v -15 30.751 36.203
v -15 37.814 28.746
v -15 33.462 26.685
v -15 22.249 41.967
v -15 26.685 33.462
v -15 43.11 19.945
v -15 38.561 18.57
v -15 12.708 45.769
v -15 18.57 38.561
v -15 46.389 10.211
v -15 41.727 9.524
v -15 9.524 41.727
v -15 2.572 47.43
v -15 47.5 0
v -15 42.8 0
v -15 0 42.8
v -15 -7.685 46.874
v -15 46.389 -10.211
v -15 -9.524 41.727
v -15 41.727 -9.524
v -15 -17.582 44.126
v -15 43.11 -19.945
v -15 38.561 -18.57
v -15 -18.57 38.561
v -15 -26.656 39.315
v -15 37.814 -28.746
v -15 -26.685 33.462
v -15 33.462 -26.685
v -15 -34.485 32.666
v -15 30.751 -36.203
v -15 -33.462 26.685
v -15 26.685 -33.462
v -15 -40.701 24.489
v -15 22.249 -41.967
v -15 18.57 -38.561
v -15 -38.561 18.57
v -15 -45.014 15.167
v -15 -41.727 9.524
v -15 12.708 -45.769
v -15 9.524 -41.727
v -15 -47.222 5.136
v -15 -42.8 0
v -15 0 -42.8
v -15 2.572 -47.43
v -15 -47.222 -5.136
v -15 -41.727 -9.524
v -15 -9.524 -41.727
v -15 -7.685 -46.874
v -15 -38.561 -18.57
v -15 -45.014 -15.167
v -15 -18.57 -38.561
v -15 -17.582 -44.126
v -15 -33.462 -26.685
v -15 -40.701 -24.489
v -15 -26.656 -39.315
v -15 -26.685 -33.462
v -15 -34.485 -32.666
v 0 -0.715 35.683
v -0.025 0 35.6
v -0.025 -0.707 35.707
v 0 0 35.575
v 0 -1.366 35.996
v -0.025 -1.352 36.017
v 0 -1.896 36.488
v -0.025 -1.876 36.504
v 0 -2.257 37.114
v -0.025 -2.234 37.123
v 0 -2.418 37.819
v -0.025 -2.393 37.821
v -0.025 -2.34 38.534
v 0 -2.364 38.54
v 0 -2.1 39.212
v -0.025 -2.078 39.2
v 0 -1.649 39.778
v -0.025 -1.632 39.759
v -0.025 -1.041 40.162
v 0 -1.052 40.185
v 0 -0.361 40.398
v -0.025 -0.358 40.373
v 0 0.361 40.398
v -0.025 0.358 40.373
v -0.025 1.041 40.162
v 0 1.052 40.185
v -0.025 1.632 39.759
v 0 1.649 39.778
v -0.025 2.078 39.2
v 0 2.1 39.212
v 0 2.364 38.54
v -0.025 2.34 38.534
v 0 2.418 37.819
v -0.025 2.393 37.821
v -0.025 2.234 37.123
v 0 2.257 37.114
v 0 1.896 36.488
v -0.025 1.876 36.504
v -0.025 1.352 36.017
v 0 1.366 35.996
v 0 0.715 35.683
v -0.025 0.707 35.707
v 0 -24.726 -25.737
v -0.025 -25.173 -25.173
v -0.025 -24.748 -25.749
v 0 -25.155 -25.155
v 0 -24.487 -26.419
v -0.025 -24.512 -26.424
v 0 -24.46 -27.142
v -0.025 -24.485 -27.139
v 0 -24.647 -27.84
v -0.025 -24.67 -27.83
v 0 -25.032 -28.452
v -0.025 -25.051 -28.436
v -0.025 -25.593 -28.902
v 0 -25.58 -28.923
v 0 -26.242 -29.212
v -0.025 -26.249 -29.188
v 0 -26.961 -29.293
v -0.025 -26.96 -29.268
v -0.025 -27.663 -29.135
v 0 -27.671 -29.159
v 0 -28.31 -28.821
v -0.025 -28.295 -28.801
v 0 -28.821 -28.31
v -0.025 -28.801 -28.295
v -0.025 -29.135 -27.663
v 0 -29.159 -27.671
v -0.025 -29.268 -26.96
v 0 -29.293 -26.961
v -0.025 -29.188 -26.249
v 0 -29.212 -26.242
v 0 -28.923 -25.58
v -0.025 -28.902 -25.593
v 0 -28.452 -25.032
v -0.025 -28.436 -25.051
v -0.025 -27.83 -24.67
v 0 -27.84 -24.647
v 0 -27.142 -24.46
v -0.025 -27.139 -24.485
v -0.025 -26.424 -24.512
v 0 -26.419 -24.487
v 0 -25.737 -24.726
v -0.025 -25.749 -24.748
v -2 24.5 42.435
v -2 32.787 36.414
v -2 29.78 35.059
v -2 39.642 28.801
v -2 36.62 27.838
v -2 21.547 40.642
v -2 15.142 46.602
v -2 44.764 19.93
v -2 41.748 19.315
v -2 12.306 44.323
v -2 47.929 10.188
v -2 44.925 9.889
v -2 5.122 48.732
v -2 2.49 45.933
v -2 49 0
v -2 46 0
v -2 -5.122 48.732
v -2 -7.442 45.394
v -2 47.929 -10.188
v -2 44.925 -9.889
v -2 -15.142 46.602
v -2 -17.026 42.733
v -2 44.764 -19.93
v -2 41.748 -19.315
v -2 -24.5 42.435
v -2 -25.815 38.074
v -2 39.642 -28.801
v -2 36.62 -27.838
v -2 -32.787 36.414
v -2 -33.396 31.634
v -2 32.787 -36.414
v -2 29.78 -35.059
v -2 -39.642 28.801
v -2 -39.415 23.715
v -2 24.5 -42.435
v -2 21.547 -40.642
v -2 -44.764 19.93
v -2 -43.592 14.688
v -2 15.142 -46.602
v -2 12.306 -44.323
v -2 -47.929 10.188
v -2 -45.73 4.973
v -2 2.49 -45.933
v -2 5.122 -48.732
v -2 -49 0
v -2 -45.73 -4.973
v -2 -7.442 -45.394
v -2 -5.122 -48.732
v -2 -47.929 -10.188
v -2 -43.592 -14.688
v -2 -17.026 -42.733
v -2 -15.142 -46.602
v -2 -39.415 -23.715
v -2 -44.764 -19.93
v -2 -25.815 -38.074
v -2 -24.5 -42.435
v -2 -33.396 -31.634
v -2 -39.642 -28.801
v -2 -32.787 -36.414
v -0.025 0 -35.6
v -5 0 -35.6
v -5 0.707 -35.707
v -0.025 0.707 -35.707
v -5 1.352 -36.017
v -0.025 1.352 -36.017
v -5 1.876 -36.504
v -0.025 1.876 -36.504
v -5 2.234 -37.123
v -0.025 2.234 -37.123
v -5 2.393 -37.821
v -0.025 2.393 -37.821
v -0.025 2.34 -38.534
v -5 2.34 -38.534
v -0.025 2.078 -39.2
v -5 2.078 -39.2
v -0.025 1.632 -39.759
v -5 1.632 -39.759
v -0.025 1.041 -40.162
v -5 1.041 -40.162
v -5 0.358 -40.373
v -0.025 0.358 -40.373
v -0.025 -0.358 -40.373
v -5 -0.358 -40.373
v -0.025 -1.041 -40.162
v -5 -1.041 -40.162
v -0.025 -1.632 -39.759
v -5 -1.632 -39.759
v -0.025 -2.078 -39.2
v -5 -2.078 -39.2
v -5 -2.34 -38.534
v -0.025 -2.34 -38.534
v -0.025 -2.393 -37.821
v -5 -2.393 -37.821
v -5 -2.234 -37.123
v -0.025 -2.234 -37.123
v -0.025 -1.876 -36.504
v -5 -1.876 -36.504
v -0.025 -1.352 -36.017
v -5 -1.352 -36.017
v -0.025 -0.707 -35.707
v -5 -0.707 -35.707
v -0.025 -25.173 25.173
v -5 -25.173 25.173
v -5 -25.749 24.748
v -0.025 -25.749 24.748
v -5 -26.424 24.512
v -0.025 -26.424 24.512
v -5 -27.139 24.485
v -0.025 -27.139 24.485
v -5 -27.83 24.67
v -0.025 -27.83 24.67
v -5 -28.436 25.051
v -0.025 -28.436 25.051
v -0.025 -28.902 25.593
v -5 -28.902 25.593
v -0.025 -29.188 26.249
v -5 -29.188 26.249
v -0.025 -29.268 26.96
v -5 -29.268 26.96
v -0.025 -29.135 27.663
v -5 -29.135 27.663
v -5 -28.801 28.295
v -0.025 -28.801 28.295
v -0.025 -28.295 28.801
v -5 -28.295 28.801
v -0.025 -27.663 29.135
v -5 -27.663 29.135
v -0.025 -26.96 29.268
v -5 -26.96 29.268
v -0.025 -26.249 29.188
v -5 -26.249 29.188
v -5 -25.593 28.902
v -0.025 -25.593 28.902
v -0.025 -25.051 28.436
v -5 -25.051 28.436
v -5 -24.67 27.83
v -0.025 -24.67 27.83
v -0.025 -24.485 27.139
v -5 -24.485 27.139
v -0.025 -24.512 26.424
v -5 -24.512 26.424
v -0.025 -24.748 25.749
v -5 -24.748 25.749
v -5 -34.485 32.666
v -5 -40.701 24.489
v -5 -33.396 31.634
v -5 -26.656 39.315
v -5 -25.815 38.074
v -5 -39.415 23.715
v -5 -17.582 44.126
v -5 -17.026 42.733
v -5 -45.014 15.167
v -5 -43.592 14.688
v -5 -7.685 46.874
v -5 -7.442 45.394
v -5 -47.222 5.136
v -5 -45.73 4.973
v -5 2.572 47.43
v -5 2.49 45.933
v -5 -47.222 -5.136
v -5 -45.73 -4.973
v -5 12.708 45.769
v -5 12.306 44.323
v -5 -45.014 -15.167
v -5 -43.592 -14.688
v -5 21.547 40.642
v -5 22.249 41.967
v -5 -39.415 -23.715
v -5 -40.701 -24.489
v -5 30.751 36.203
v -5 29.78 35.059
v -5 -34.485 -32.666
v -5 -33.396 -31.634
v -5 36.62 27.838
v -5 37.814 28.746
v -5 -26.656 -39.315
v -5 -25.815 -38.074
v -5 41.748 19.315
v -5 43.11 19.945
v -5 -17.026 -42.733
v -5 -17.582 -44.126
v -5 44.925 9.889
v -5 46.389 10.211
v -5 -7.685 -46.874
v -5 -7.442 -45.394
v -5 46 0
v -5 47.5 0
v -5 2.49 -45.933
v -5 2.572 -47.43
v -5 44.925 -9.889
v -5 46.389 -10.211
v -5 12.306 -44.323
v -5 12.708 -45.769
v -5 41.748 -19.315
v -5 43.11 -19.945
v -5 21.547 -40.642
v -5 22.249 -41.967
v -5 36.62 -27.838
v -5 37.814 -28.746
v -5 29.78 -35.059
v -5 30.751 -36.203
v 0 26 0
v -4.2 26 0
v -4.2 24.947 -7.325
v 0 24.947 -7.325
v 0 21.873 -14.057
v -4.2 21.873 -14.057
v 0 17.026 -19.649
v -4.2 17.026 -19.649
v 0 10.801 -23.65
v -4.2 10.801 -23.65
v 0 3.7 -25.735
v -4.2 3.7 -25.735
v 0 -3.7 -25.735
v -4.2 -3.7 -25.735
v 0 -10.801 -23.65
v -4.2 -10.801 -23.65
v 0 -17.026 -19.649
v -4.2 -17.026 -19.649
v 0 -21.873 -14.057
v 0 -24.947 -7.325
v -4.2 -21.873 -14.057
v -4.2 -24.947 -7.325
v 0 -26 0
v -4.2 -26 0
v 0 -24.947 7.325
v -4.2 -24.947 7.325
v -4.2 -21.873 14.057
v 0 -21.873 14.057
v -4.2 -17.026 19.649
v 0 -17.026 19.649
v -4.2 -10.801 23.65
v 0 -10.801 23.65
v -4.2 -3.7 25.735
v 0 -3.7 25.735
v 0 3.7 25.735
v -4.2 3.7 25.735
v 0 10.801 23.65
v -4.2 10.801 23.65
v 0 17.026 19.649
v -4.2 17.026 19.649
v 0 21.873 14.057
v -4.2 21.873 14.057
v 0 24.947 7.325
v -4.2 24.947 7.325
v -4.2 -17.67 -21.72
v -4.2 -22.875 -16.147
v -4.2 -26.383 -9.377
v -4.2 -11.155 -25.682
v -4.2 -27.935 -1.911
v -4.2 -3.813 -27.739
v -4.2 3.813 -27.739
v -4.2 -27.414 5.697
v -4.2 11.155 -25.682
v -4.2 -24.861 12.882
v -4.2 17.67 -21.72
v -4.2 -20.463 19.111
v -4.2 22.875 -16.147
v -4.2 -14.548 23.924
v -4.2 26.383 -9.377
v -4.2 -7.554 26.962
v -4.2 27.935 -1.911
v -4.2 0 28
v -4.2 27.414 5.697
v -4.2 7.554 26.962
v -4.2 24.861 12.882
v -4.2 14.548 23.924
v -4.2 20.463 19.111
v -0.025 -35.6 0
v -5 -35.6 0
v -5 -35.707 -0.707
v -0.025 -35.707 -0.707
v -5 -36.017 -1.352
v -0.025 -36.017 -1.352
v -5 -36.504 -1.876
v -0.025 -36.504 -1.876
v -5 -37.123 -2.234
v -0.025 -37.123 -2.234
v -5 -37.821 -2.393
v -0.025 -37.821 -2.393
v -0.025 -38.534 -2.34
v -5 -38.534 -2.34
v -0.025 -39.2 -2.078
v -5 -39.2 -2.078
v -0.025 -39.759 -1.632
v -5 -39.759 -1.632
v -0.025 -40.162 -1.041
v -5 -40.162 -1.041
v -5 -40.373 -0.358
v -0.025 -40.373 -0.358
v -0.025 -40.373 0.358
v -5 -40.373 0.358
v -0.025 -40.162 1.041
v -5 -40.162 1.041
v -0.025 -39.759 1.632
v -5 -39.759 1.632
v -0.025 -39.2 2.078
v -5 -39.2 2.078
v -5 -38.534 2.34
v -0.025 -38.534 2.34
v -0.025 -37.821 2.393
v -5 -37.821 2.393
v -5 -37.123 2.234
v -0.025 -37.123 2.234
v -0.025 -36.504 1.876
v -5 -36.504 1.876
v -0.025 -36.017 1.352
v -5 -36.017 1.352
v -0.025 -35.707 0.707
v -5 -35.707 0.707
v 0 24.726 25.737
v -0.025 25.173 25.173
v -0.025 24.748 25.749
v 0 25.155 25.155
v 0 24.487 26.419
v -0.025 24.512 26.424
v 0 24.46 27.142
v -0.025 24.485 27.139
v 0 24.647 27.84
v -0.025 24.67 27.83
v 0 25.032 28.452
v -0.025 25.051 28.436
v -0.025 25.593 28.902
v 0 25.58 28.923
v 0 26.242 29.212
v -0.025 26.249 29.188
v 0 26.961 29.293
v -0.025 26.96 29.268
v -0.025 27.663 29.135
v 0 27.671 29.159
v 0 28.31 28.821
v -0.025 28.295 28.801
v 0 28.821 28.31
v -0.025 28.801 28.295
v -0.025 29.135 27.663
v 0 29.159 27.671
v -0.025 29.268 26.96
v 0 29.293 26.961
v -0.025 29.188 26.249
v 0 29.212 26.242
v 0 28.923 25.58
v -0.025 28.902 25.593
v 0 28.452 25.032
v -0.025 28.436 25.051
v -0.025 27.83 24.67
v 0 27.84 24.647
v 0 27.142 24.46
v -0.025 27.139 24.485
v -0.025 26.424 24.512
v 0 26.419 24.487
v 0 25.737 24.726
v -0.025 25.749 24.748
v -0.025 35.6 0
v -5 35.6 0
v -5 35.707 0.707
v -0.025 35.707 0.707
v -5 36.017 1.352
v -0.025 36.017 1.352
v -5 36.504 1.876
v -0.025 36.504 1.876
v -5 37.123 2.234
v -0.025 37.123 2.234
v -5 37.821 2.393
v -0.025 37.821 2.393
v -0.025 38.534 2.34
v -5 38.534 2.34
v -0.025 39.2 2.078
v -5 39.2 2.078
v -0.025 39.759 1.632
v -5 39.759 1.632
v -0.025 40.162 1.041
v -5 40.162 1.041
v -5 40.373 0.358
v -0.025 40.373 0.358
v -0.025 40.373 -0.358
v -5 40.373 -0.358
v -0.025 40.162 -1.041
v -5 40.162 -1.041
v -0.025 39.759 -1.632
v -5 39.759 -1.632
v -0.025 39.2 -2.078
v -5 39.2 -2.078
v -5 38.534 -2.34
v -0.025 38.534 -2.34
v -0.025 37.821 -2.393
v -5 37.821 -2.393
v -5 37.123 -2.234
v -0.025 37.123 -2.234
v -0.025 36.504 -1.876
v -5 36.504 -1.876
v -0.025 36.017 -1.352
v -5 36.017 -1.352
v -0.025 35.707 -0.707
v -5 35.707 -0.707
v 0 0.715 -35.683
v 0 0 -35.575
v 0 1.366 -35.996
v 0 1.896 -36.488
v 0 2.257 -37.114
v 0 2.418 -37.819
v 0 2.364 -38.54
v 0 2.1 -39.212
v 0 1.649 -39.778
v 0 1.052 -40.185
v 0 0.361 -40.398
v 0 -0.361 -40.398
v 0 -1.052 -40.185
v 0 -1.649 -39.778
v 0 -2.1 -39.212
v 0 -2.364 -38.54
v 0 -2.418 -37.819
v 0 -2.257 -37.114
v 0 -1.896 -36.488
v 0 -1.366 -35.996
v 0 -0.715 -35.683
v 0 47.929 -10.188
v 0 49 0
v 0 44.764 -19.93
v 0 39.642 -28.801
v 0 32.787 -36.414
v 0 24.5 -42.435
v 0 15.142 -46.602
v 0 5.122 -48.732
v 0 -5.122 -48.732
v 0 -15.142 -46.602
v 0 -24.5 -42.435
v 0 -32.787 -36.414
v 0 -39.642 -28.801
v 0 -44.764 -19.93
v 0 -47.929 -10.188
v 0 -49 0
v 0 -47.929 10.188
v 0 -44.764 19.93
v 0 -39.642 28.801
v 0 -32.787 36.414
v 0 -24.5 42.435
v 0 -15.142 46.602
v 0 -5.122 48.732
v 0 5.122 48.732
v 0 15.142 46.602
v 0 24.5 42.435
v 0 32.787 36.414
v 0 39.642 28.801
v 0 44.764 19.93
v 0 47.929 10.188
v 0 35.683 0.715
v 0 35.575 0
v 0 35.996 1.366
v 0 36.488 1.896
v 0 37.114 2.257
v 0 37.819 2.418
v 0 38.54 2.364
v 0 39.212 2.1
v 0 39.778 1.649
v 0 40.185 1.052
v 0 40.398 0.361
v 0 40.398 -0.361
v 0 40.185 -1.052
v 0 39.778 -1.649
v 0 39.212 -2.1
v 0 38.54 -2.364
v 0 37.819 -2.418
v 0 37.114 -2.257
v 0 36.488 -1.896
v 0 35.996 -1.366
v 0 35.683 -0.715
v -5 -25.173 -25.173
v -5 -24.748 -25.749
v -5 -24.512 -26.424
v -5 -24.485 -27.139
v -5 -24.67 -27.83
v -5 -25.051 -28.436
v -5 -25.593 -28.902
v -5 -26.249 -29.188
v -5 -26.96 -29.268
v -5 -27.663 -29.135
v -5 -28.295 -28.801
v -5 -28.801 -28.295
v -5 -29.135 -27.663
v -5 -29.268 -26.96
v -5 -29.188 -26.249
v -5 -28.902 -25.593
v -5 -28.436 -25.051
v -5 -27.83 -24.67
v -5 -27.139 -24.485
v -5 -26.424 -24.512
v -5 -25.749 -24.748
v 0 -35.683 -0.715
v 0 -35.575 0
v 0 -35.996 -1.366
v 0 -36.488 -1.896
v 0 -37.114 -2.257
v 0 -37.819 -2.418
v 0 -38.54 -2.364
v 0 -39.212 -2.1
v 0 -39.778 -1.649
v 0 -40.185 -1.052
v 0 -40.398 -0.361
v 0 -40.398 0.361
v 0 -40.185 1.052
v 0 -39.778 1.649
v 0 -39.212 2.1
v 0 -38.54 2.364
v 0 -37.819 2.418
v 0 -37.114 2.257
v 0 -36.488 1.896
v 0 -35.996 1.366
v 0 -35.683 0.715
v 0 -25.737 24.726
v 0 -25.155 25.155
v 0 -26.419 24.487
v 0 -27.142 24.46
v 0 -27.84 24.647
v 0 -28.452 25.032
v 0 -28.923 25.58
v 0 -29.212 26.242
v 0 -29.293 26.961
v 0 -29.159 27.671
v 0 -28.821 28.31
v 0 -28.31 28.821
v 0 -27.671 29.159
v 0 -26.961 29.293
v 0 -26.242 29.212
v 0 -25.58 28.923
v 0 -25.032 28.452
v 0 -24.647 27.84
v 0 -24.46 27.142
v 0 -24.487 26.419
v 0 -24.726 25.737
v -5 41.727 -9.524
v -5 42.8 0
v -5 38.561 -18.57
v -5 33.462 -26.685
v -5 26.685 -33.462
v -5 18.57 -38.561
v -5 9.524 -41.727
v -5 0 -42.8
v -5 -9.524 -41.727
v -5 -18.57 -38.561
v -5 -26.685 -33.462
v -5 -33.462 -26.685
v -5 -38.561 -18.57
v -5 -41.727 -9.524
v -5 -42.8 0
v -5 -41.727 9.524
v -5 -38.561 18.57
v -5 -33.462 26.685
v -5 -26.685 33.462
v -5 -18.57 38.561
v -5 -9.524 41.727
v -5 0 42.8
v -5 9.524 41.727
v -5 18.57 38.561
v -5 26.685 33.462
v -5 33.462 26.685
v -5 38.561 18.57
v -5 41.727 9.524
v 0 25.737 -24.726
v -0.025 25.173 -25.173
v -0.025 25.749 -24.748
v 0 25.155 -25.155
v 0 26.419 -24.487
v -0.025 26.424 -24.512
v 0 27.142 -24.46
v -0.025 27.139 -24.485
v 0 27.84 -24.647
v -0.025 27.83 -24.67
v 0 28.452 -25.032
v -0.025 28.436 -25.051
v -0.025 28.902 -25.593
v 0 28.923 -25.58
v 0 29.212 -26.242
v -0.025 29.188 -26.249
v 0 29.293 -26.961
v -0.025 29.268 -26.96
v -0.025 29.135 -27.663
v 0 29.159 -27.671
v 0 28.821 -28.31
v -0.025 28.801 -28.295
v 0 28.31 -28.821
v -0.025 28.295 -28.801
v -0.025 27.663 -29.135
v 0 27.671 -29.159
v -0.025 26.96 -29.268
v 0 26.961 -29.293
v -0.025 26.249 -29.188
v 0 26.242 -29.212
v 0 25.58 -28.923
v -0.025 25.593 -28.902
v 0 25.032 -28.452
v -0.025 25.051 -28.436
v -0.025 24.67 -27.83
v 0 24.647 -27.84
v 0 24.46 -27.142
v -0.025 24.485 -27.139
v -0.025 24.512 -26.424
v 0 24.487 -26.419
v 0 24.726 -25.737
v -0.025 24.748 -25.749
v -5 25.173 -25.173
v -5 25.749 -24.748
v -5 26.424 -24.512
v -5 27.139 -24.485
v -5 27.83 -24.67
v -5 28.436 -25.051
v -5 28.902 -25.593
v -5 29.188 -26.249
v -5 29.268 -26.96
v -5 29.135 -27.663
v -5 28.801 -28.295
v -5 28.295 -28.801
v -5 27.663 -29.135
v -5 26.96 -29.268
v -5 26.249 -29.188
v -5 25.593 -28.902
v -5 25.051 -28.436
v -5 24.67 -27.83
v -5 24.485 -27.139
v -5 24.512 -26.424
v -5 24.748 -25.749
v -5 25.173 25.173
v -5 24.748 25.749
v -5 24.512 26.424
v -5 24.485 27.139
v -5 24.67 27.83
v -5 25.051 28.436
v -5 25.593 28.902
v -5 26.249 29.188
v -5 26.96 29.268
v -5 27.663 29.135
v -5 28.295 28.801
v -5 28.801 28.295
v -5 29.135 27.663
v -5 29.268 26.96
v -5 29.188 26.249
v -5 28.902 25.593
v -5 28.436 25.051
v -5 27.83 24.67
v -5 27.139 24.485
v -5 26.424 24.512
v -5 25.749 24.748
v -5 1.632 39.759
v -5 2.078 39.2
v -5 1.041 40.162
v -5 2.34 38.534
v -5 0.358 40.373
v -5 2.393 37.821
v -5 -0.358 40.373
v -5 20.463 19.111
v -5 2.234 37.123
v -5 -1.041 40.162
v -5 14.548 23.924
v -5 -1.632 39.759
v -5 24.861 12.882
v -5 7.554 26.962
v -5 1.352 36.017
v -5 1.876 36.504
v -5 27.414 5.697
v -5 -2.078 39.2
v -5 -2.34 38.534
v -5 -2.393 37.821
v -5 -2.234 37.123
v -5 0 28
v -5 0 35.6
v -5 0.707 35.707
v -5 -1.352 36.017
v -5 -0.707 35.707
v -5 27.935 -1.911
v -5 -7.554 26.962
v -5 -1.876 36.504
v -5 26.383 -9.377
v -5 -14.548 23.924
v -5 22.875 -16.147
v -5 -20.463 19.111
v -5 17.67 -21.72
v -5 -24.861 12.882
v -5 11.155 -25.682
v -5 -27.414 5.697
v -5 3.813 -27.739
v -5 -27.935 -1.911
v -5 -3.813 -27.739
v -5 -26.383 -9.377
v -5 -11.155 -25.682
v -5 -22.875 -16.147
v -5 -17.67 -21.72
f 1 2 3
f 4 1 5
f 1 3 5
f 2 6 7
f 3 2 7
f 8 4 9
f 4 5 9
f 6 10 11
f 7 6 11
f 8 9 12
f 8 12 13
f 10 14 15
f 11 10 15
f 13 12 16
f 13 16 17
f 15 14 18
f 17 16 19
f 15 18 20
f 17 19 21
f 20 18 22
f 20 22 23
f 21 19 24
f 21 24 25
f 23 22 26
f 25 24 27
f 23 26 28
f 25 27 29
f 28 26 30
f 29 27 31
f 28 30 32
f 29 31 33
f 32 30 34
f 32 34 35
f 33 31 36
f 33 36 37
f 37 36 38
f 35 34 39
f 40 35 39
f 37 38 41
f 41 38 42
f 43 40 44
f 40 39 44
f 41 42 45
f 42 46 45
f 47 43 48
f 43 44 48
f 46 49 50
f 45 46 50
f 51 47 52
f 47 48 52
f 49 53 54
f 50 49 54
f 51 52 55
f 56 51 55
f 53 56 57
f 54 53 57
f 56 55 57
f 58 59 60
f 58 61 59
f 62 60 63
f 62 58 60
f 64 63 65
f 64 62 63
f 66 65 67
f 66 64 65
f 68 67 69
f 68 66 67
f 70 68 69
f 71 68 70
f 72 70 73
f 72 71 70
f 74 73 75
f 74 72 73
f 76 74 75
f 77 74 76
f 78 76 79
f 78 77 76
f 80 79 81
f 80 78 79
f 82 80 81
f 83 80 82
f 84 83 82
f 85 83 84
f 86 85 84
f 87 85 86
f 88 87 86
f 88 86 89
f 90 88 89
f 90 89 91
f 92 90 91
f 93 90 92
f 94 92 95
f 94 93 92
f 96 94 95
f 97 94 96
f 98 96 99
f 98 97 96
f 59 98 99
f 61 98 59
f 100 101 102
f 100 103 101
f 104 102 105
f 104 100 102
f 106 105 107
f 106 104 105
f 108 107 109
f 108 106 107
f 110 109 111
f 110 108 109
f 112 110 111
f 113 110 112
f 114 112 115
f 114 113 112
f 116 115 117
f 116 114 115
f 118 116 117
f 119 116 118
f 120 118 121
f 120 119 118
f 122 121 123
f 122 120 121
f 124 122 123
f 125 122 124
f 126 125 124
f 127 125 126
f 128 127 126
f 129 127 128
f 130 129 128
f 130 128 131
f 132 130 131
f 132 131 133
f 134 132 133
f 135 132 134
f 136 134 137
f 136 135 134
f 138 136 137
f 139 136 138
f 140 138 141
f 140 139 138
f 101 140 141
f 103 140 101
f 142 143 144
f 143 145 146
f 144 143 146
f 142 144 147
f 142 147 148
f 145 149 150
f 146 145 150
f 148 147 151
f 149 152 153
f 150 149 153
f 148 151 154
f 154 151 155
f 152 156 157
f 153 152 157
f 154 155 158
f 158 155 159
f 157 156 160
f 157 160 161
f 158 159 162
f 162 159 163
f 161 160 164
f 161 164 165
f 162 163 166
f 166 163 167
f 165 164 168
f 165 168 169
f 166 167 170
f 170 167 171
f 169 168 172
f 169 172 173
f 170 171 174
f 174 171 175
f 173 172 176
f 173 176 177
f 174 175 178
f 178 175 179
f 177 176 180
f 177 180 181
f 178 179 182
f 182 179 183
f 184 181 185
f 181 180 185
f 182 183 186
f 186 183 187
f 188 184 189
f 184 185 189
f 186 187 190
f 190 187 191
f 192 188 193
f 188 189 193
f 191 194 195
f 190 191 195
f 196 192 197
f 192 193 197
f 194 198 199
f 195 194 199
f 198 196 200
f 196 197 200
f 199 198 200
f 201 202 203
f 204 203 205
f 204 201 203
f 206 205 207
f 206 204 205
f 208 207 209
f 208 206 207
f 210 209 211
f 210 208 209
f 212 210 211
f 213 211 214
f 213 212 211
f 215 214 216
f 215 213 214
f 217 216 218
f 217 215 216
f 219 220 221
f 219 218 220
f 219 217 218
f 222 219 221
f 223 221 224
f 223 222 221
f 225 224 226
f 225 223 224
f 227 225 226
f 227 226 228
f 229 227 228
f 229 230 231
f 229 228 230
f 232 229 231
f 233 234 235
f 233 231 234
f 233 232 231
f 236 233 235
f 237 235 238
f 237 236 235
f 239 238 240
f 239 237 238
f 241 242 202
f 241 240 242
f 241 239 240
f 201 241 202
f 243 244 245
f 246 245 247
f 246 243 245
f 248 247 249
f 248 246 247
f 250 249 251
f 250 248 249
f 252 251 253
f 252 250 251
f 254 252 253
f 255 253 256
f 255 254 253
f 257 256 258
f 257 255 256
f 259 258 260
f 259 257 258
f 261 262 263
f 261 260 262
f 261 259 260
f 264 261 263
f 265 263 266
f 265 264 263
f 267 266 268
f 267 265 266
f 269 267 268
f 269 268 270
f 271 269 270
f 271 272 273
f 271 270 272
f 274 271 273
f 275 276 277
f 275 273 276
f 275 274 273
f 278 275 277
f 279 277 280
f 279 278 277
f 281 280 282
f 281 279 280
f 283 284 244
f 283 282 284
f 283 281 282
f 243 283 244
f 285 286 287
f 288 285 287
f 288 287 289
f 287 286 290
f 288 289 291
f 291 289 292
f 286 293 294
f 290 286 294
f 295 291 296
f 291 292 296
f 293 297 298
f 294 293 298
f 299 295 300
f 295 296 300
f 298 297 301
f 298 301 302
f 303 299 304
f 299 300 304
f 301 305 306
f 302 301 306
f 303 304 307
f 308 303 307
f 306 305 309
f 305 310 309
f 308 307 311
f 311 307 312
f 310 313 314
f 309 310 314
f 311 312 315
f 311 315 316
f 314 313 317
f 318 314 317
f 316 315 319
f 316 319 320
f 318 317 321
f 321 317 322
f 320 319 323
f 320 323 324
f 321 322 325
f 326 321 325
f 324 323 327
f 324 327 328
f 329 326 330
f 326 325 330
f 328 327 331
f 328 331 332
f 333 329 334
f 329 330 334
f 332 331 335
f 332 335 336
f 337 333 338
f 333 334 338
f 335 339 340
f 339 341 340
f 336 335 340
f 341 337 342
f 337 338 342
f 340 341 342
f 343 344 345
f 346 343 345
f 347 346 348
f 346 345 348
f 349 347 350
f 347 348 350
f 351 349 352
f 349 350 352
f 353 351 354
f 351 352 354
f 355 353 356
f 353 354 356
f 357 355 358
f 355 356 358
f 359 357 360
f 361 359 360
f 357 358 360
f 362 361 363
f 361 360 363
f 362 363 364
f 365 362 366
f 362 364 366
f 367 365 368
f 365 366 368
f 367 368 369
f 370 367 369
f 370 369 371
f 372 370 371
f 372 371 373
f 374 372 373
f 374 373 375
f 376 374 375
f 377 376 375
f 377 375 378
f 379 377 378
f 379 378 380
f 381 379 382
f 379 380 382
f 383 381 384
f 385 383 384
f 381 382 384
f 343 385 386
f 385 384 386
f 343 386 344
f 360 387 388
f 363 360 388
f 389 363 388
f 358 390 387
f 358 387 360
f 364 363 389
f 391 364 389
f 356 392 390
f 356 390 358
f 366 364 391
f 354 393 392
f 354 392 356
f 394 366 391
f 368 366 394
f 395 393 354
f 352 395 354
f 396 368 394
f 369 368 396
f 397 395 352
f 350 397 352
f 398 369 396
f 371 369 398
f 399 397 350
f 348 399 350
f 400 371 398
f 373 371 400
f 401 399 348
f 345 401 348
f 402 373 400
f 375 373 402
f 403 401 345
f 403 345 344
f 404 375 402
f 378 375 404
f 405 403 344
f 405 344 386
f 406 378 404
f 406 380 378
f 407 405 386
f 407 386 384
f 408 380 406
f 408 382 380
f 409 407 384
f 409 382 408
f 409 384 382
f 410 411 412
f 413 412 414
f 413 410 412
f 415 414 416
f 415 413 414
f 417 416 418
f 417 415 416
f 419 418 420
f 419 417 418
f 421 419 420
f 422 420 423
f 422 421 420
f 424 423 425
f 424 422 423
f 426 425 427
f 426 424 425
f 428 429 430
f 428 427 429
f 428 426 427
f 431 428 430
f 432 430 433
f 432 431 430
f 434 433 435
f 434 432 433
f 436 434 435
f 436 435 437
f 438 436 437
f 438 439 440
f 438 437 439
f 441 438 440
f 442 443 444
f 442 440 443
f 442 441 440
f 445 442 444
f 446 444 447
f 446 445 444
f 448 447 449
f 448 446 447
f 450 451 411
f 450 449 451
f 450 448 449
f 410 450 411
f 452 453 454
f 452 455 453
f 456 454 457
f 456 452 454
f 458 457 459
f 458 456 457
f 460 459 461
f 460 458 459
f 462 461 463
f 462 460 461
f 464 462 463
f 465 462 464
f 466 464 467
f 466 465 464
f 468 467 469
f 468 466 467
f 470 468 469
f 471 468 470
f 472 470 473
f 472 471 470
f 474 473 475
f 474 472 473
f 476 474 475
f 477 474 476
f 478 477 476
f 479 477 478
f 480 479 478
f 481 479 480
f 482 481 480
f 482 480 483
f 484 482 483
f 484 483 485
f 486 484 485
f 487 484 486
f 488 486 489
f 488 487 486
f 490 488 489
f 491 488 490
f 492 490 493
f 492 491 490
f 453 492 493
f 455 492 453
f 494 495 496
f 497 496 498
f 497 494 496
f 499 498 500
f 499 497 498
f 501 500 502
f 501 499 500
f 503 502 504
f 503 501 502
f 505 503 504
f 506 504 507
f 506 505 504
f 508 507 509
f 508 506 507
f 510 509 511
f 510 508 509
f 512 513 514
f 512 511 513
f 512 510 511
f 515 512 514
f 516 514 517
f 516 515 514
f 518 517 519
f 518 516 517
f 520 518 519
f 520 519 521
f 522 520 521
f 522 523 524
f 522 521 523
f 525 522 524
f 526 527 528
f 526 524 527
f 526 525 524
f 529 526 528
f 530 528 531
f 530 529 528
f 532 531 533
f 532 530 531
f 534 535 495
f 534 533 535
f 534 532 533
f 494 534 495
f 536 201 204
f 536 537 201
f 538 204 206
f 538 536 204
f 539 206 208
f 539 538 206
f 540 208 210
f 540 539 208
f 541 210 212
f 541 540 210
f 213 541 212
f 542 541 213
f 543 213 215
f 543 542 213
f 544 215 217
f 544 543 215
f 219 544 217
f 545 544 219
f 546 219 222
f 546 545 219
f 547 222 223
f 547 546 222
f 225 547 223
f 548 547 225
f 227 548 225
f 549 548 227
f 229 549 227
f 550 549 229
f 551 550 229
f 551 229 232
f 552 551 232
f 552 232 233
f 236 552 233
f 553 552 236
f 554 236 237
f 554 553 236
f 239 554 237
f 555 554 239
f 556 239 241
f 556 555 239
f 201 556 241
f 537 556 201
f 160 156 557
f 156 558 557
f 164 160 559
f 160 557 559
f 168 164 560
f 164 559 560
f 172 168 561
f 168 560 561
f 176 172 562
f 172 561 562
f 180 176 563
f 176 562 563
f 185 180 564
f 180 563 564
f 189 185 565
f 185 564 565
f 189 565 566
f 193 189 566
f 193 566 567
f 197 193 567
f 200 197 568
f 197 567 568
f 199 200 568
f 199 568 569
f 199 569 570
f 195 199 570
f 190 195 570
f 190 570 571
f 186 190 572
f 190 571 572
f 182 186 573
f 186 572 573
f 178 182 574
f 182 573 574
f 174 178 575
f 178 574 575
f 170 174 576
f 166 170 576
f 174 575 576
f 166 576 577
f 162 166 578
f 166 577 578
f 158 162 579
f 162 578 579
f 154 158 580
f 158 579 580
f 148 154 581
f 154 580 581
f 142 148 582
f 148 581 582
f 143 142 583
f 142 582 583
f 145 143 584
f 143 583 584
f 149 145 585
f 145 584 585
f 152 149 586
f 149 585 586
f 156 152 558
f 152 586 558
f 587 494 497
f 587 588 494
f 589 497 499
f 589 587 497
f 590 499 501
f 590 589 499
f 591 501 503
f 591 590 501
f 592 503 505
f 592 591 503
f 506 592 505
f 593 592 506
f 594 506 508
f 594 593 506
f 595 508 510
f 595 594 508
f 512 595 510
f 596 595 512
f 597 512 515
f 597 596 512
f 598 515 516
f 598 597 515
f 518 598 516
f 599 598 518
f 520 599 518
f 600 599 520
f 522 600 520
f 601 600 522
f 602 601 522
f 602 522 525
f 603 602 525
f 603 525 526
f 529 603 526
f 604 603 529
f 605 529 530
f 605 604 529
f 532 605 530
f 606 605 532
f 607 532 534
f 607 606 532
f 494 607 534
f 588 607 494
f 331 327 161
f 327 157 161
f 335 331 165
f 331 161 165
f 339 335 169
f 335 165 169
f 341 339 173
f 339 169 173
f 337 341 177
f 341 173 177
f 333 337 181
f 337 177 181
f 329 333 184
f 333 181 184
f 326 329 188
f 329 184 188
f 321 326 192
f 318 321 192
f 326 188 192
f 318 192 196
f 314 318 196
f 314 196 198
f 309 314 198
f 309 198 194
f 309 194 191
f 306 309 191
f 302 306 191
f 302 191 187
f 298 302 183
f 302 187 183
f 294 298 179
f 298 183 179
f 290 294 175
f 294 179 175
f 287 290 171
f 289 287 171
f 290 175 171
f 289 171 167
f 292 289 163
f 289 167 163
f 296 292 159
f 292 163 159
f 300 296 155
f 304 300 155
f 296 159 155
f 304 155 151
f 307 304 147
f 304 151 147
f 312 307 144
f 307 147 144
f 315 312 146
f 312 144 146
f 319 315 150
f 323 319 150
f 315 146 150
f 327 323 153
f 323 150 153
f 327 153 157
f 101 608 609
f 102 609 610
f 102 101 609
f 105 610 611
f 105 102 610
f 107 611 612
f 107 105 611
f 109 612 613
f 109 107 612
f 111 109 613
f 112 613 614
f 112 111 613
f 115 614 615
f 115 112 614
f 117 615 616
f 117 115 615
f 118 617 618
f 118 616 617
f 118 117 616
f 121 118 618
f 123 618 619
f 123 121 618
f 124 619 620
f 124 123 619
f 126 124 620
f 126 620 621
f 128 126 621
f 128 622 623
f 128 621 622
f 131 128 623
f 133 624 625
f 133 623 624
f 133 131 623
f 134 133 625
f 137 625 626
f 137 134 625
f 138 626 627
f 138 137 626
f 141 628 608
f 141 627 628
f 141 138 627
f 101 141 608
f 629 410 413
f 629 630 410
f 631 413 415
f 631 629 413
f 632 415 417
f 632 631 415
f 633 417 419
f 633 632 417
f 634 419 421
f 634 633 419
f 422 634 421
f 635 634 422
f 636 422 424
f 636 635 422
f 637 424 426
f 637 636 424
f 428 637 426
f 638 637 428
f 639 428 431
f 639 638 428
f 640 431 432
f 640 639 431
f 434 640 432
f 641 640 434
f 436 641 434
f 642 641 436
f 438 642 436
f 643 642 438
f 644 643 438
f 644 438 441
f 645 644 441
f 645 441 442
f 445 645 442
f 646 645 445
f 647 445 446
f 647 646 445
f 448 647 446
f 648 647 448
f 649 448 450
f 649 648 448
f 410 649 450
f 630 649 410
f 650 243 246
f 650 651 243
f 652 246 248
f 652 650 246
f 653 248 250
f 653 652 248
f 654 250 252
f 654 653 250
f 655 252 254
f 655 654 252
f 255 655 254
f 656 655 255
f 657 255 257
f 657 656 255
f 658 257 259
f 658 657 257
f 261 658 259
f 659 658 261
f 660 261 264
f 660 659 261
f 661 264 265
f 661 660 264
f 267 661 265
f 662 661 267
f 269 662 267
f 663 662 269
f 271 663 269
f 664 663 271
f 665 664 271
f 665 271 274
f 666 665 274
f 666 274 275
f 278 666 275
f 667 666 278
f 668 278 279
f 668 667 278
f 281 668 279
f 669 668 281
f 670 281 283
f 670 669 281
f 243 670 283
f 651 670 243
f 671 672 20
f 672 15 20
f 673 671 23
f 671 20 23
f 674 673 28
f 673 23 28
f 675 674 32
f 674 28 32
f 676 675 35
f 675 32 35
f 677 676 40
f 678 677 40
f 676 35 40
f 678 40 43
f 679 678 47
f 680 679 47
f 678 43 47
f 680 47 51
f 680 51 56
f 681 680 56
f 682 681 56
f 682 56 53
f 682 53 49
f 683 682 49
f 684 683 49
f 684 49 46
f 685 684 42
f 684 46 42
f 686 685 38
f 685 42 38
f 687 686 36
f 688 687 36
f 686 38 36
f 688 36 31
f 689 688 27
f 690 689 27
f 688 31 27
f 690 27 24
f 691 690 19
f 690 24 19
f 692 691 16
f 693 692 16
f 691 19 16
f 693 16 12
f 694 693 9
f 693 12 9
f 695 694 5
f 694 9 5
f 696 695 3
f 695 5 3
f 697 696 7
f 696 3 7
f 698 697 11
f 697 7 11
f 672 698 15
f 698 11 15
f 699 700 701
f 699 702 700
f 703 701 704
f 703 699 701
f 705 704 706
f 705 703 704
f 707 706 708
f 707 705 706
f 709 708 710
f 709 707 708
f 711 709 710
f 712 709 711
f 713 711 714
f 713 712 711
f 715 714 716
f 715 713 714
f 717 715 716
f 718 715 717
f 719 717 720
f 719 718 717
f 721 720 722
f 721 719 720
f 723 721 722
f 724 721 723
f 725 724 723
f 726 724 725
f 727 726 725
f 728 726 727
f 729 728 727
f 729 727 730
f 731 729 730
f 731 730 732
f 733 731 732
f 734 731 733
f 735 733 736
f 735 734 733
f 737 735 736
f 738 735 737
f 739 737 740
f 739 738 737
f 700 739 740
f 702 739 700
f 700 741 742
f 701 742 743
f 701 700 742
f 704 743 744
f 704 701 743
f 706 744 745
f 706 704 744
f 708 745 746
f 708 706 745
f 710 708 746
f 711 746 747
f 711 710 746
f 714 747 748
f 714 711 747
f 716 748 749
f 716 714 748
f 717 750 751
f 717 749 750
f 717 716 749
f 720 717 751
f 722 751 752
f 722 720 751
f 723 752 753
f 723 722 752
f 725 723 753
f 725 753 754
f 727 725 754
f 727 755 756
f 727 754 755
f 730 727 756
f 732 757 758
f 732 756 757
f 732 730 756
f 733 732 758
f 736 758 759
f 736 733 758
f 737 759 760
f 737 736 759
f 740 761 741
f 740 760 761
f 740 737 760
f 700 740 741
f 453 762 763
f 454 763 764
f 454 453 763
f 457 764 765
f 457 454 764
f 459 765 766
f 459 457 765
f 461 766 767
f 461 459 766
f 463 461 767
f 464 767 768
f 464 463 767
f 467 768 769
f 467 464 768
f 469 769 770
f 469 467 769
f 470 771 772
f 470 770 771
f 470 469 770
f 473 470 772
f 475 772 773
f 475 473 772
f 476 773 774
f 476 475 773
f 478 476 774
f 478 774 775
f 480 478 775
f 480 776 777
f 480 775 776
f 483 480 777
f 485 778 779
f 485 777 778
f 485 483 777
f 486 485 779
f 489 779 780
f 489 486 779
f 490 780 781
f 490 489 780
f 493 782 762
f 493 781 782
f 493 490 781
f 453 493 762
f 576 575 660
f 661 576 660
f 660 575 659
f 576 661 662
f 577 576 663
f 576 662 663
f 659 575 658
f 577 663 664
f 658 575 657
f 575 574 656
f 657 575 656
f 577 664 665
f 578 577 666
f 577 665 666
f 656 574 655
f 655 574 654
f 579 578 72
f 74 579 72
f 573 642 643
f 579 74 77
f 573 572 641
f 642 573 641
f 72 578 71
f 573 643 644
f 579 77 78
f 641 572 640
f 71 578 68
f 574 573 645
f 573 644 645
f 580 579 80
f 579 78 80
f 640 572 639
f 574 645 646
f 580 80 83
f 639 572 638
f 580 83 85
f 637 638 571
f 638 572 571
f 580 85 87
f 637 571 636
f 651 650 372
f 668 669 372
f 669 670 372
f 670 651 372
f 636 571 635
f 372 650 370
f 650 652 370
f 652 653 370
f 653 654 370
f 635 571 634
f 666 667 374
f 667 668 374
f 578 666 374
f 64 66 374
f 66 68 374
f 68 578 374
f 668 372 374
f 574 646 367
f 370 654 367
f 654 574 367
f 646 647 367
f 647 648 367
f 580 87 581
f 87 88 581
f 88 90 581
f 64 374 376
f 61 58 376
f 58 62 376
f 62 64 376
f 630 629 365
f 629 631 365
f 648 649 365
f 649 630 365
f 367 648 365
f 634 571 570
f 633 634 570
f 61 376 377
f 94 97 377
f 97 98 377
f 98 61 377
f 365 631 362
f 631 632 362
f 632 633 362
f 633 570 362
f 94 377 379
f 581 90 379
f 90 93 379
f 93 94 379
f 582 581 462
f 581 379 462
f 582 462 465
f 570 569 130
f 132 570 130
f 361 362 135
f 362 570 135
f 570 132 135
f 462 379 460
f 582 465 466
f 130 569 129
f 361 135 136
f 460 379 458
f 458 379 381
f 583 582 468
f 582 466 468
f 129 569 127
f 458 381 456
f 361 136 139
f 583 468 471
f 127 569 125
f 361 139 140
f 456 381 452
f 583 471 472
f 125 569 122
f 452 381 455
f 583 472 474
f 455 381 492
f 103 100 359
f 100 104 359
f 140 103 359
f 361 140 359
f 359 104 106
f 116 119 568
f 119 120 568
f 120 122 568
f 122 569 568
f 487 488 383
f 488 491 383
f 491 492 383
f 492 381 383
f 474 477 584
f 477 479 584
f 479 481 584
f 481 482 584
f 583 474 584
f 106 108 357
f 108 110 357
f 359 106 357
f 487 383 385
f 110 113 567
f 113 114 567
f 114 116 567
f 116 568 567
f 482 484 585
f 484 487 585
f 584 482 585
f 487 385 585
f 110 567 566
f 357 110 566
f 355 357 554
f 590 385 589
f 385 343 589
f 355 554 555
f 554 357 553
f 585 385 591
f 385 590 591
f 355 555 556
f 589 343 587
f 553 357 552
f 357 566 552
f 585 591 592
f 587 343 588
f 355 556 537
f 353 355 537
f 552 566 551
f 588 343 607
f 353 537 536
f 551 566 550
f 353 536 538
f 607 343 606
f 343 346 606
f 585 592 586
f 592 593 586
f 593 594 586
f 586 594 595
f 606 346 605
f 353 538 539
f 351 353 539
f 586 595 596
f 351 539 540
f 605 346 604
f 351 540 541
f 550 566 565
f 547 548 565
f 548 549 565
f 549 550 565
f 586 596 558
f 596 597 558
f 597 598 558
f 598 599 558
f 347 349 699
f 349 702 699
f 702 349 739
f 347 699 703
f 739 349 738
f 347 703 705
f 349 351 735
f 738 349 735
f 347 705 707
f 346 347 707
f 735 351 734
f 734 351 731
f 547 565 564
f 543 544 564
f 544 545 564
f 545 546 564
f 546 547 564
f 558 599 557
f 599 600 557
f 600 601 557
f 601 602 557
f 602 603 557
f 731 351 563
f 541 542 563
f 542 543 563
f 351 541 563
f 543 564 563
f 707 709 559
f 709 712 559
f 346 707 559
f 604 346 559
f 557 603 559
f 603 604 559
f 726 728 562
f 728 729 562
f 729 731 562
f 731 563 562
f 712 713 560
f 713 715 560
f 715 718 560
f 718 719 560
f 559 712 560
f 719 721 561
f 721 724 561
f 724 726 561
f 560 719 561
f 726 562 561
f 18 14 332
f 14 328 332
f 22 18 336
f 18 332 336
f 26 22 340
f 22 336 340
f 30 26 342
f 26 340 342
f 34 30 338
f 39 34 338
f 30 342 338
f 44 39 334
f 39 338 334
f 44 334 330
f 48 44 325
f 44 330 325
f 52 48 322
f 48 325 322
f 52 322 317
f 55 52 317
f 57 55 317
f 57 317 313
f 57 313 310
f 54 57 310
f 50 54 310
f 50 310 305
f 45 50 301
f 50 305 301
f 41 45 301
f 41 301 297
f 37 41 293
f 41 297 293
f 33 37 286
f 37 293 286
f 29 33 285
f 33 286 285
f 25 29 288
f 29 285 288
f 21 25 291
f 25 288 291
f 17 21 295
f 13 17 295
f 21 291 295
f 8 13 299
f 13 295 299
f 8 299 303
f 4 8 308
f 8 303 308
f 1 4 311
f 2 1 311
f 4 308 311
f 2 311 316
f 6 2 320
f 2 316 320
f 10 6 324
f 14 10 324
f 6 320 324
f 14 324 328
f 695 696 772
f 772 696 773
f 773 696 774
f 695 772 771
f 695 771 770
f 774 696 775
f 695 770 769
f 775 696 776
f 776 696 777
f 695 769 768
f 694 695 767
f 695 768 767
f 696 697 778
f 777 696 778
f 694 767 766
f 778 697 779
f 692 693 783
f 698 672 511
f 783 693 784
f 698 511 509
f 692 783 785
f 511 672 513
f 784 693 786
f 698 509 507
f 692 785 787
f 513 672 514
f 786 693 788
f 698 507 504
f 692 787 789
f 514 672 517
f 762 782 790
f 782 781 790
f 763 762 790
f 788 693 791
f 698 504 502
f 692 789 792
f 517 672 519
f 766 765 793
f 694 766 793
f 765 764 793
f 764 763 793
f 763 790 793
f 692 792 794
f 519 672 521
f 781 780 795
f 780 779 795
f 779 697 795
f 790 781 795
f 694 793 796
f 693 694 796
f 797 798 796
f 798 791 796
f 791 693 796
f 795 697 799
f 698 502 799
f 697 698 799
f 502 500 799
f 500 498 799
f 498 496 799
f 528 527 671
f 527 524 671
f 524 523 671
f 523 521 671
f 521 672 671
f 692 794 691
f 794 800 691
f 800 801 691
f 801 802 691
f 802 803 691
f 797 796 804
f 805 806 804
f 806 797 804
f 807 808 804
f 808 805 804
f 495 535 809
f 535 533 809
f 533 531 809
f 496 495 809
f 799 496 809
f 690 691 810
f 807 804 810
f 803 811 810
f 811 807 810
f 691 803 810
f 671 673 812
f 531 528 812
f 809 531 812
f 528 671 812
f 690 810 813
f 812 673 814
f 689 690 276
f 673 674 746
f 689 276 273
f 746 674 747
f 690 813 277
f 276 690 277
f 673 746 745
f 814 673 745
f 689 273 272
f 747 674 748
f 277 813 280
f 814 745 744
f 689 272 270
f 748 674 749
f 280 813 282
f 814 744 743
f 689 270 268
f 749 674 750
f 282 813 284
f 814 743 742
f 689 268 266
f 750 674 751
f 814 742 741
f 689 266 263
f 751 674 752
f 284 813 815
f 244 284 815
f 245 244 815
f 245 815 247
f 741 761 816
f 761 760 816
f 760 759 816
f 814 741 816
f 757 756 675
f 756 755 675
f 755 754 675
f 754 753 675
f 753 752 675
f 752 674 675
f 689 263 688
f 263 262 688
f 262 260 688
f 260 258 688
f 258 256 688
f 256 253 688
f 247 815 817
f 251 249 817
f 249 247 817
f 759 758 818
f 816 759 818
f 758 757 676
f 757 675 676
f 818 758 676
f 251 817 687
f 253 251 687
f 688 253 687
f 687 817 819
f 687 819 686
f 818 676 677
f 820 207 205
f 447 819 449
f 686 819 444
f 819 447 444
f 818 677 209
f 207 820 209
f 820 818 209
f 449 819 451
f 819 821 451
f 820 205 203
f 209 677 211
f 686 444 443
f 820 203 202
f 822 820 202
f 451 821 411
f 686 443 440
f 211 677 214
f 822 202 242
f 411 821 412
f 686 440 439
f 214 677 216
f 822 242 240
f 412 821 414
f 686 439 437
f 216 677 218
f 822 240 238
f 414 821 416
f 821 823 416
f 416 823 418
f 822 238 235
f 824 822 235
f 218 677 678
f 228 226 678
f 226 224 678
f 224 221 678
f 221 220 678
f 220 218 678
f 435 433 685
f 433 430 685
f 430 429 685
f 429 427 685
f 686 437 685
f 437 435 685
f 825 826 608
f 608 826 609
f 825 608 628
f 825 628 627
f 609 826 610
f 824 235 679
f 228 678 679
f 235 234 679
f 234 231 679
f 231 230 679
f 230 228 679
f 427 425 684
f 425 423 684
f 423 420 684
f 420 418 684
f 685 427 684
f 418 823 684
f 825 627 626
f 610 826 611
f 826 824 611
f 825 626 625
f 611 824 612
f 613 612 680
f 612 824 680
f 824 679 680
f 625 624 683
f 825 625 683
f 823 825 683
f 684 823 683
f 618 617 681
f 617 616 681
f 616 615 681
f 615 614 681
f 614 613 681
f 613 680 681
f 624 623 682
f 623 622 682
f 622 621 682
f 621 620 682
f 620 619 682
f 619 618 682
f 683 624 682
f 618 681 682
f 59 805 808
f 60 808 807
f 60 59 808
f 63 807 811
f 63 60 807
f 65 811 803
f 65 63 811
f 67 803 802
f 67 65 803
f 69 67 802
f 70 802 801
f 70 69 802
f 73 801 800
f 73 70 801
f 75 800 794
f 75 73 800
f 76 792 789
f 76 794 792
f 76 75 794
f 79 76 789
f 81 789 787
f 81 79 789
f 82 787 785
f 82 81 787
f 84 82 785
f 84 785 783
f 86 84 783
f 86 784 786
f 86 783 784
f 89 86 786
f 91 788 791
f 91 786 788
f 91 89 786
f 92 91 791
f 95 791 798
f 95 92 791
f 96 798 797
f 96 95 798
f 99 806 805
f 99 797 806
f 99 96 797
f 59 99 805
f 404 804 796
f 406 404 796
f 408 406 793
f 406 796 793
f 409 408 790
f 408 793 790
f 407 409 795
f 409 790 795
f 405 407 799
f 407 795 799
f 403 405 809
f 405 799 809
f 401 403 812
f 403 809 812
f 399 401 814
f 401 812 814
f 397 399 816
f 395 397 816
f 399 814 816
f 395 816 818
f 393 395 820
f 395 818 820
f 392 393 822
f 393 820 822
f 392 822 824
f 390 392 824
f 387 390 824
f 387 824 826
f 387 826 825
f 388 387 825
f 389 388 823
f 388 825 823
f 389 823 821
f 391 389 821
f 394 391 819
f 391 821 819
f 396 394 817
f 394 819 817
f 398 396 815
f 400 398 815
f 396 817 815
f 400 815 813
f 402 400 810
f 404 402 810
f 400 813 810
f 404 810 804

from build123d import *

# Parameters (mm, degrees)
CIRPATTERN1_COUNT  = 8
SKETCH4_R          = 28
CUT_EXTRUDE1_DEPTH = 0.8


with BuildPart() as part:
    # Sketch1 → Revolve1 (revolve)
    with BuildSketch(Plane.XY):
        Polygon((-15, 47.5), (-5, 47.5), (-5, 46), (-2, 46), (-2, 49), (0, 49), (0, 26), (-5, 26), (-5, 42.8), (-15, 42.8), align=None)
    revolve(axis=Axis((0, 0, 0), (-1, 0, 0)))

    # Sketch3 → M4 Clearance Hole1 (revolve, cut)
    with BuildSketch(Plane(origin=(0, 0, 38), x_dir=(0, 0, -1), z_dir=(0, 1, 0))):
        Polygon((0, 0), (0, 22.442065486), (2.4, 21), (2.4, 0.025), (2.425, 0), align=None)
    m4_clearance_hole1 = revolve(axis=Axis((6.35, 0, 38), (-1, 0, 0)), mode=Mode.SUBTRACT)

    # CirPattern1: M4 Clearance Hole1 ×8 about axis
    cirpattern1_axis = Axis((0, 0, 0), (1, 0, 0))
    for i in range(1, CIRPATTERN1_COUNT):
        add(m4_clearance_hole1.rotate(cirpattern1_axis, i * 360 / CIRPATTERN1_COUNT), mode=Mode.SUBTRACT)

    # Sketch4 → Cut-Extrude1 (cut)
    with BuildSketch(Plane.ZY.offset(5)):
        Circle(SKETCH4_R)
    extrude(amount=-CUT_EXTRUDE1_DEPTH, mode=Mode.SUBTRACT)


solid = part.part
